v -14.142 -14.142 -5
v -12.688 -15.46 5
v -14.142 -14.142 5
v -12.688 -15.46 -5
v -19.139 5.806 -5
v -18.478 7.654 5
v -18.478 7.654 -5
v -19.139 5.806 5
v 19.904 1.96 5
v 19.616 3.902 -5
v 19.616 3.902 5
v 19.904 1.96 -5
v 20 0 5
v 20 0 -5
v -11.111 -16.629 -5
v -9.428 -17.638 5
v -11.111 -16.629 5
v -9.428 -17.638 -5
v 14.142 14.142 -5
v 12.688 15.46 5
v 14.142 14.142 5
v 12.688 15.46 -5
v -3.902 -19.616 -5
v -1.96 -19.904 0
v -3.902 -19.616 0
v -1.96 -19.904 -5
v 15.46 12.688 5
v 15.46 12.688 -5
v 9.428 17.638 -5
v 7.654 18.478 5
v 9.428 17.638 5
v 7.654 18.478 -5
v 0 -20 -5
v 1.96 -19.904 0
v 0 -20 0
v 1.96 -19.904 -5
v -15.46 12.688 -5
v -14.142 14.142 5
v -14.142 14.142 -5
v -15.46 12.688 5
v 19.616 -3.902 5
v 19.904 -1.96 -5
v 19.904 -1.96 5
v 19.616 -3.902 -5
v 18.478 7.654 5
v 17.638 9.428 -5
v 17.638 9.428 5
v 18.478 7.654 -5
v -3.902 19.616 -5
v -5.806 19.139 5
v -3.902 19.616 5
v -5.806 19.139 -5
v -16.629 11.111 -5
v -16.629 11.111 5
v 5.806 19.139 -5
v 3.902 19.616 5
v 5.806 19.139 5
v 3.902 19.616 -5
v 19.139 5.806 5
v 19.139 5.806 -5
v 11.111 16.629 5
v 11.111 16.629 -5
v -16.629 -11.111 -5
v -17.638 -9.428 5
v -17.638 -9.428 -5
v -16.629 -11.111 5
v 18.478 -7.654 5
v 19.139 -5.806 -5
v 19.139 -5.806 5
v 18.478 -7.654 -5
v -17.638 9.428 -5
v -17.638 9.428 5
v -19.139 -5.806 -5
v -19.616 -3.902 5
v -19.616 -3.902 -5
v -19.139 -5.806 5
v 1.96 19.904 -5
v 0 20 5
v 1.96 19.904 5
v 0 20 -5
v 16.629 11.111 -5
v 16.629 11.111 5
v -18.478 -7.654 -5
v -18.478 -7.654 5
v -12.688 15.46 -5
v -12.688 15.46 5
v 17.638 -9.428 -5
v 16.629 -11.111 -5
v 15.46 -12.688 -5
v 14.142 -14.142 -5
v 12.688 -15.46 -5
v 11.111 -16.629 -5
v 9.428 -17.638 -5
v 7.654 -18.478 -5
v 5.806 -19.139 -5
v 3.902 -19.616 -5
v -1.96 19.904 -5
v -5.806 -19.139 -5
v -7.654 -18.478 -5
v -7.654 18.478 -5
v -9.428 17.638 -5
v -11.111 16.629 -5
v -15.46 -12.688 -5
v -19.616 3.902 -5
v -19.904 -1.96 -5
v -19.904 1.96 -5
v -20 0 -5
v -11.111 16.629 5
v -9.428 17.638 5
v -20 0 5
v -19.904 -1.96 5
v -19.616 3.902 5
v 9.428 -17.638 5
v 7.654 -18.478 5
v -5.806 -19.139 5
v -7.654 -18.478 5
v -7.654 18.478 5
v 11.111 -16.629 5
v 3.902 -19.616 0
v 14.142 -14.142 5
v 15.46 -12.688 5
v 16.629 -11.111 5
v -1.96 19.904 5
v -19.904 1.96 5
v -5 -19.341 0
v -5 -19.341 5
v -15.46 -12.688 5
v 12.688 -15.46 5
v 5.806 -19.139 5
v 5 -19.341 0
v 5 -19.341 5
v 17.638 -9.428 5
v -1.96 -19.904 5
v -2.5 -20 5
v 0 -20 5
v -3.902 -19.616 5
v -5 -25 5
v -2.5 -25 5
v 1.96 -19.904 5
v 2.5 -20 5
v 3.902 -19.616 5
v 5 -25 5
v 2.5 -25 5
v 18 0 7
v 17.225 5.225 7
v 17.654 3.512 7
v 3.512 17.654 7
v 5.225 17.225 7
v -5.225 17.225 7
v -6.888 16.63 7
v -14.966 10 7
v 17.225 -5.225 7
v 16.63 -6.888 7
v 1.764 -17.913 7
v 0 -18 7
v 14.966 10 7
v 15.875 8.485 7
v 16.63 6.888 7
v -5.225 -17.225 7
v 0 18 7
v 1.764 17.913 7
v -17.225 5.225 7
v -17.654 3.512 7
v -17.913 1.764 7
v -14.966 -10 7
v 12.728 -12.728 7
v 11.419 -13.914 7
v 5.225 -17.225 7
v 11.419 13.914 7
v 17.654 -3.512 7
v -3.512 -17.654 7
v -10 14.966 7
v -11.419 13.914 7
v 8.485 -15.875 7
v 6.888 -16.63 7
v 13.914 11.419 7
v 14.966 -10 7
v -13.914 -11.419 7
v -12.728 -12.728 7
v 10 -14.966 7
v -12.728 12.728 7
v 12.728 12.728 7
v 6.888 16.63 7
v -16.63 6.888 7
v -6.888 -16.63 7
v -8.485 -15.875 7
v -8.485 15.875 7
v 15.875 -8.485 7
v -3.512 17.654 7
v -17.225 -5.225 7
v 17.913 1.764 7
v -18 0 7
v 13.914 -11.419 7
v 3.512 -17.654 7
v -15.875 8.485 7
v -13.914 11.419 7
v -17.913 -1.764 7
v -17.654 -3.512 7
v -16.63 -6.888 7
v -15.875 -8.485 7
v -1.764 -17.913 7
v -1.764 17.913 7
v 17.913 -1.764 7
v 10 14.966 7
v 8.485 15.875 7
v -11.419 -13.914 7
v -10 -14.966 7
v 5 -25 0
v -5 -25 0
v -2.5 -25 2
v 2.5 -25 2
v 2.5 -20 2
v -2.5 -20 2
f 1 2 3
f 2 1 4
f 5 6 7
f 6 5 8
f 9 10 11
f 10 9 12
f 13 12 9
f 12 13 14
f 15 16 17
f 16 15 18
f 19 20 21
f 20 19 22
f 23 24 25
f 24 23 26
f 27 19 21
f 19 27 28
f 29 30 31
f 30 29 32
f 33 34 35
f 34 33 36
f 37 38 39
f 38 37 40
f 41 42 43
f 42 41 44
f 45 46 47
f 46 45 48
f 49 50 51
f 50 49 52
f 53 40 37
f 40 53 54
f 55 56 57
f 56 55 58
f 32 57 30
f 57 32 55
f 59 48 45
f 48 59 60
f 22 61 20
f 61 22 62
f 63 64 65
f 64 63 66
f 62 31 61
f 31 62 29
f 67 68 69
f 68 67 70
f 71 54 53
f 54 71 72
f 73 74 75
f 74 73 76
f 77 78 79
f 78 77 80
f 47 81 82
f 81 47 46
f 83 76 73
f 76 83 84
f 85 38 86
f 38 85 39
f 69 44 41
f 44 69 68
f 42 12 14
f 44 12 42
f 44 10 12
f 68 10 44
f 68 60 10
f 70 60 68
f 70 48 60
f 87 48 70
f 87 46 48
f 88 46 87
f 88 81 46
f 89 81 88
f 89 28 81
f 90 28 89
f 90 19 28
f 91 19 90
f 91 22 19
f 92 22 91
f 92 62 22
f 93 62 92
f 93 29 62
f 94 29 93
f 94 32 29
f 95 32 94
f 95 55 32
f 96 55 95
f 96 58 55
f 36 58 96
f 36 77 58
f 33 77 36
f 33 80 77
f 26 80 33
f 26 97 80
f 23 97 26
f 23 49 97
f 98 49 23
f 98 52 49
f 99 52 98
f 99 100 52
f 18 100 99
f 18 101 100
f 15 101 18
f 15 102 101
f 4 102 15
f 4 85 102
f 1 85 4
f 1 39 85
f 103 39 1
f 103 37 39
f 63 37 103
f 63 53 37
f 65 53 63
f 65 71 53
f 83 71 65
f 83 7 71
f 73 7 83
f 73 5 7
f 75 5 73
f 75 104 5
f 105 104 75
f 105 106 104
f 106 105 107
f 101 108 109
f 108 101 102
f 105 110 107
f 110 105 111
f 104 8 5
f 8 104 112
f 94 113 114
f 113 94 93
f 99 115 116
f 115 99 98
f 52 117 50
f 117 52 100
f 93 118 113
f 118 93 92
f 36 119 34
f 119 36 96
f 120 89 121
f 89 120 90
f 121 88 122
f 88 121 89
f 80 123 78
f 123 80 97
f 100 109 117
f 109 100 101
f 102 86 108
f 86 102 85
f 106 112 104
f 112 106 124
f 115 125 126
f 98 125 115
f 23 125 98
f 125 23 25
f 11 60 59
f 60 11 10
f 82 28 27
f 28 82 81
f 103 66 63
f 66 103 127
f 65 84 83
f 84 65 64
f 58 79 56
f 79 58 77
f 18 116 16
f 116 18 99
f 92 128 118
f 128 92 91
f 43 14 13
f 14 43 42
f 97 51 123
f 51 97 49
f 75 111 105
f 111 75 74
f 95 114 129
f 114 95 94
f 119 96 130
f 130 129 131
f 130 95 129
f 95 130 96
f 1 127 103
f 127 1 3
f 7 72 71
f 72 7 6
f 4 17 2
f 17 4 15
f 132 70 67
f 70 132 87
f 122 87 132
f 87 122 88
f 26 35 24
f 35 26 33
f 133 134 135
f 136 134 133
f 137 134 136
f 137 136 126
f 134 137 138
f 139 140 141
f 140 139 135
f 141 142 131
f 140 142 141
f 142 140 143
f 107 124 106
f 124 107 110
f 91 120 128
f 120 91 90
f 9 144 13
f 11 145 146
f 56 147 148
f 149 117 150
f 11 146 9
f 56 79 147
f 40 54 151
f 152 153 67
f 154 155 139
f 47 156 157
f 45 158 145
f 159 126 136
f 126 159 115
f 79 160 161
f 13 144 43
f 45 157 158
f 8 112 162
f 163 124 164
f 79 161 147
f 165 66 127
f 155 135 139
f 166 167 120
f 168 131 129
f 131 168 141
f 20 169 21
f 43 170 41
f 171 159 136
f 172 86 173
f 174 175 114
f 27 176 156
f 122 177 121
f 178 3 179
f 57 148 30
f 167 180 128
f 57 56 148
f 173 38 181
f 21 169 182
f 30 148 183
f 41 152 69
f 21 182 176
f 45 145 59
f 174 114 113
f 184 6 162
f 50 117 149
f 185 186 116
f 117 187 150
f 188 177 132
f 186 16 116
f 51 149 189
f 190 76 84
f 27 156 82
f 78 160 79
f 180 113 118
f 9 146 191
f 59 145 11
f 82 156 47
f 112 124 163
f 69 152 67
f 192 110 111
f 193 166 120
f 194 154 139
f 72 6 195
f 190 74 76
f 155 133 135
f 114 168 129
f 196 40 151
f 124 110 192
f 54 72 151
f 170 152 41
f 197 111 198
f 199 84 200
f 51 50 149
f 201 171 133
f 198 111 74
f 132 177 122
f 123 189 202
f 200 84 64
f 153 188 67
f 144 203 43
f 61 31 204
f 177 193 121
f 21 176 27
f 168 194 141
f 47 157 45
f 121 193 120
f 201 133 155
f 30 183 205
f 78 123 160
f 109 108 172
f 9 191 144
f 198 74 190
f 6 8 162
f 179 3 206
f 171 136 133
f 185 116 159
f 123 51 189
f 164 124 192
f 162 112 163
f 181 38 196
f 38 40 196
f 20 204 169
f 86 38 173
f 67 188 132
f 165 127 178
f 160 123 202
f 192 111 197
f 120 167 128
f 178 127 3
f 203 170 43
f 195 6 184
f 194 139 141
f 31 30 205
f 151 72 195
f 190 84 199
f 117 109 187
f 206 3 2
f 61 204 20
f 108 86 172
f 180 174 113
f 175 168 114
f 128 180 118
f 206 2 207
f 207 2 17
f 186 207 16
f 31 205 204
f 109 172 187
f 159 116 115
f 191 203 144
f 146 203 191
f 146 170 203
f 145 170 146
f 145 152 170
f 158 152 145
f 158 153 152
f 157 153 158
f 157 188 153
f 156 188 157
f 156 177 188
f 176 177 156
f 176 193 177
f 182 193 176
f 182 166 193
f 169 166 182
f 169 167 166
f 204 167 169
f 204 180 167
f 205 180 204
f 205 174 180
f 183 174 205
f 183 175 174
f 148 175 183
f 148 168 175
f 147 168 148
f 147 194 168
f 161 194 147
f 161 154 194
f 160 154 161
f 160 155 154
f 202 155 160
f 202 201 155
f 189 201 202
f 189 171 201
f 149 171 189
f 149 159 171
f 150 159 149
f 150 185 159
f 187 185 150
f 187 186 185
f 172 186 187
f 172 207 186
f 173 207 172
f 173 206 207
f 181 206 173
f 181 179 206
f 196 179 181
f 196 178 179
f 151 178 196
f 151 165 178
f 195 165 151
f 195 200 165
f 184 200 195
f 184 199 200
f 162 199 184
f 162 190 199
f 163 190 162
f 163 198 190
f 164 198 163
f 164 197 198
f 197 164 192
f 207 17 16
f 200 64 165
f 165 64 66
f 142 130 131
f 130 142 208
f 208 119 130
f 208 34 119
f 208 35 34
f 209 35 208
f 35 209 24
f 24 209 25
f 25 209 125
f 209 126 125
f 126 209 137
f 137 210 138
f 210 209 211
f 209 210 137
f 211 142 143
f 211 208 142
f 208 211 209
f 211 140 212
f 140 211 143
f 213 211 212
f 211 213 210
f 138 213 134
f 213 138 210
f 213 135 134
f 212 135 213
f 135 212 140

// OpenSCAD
module sleeve_cap() {
    difference() {
        union() {
            // Main cylindrical body
            cylinder(h=10, r=20, $fn=64);
            
            // Chamfered/rounded edges
            translate([0, 0, 10])
                cylinder(h=2, r1=20, r2=18, $fn=64);
            translate([0, 0, 0])
                cylinder(h=2, r1=18, r2=20, $fn=64);
            
            // Circumferential step/groove
            translate([0, 0, 8])
                cylinder(h=2, r=18, $fn=64);
            
            // Asymmetric rectangular lug/flat
            translate([-5, -25, 5])
                cube([10, 10, 5]);
        }
        
        // Notch cutout in the lug
        translate([-2.5, -25, 7])
            cube([5, 5, 5]);
    }
}

translate([0, 0, -5])
    sleeve_cap();
